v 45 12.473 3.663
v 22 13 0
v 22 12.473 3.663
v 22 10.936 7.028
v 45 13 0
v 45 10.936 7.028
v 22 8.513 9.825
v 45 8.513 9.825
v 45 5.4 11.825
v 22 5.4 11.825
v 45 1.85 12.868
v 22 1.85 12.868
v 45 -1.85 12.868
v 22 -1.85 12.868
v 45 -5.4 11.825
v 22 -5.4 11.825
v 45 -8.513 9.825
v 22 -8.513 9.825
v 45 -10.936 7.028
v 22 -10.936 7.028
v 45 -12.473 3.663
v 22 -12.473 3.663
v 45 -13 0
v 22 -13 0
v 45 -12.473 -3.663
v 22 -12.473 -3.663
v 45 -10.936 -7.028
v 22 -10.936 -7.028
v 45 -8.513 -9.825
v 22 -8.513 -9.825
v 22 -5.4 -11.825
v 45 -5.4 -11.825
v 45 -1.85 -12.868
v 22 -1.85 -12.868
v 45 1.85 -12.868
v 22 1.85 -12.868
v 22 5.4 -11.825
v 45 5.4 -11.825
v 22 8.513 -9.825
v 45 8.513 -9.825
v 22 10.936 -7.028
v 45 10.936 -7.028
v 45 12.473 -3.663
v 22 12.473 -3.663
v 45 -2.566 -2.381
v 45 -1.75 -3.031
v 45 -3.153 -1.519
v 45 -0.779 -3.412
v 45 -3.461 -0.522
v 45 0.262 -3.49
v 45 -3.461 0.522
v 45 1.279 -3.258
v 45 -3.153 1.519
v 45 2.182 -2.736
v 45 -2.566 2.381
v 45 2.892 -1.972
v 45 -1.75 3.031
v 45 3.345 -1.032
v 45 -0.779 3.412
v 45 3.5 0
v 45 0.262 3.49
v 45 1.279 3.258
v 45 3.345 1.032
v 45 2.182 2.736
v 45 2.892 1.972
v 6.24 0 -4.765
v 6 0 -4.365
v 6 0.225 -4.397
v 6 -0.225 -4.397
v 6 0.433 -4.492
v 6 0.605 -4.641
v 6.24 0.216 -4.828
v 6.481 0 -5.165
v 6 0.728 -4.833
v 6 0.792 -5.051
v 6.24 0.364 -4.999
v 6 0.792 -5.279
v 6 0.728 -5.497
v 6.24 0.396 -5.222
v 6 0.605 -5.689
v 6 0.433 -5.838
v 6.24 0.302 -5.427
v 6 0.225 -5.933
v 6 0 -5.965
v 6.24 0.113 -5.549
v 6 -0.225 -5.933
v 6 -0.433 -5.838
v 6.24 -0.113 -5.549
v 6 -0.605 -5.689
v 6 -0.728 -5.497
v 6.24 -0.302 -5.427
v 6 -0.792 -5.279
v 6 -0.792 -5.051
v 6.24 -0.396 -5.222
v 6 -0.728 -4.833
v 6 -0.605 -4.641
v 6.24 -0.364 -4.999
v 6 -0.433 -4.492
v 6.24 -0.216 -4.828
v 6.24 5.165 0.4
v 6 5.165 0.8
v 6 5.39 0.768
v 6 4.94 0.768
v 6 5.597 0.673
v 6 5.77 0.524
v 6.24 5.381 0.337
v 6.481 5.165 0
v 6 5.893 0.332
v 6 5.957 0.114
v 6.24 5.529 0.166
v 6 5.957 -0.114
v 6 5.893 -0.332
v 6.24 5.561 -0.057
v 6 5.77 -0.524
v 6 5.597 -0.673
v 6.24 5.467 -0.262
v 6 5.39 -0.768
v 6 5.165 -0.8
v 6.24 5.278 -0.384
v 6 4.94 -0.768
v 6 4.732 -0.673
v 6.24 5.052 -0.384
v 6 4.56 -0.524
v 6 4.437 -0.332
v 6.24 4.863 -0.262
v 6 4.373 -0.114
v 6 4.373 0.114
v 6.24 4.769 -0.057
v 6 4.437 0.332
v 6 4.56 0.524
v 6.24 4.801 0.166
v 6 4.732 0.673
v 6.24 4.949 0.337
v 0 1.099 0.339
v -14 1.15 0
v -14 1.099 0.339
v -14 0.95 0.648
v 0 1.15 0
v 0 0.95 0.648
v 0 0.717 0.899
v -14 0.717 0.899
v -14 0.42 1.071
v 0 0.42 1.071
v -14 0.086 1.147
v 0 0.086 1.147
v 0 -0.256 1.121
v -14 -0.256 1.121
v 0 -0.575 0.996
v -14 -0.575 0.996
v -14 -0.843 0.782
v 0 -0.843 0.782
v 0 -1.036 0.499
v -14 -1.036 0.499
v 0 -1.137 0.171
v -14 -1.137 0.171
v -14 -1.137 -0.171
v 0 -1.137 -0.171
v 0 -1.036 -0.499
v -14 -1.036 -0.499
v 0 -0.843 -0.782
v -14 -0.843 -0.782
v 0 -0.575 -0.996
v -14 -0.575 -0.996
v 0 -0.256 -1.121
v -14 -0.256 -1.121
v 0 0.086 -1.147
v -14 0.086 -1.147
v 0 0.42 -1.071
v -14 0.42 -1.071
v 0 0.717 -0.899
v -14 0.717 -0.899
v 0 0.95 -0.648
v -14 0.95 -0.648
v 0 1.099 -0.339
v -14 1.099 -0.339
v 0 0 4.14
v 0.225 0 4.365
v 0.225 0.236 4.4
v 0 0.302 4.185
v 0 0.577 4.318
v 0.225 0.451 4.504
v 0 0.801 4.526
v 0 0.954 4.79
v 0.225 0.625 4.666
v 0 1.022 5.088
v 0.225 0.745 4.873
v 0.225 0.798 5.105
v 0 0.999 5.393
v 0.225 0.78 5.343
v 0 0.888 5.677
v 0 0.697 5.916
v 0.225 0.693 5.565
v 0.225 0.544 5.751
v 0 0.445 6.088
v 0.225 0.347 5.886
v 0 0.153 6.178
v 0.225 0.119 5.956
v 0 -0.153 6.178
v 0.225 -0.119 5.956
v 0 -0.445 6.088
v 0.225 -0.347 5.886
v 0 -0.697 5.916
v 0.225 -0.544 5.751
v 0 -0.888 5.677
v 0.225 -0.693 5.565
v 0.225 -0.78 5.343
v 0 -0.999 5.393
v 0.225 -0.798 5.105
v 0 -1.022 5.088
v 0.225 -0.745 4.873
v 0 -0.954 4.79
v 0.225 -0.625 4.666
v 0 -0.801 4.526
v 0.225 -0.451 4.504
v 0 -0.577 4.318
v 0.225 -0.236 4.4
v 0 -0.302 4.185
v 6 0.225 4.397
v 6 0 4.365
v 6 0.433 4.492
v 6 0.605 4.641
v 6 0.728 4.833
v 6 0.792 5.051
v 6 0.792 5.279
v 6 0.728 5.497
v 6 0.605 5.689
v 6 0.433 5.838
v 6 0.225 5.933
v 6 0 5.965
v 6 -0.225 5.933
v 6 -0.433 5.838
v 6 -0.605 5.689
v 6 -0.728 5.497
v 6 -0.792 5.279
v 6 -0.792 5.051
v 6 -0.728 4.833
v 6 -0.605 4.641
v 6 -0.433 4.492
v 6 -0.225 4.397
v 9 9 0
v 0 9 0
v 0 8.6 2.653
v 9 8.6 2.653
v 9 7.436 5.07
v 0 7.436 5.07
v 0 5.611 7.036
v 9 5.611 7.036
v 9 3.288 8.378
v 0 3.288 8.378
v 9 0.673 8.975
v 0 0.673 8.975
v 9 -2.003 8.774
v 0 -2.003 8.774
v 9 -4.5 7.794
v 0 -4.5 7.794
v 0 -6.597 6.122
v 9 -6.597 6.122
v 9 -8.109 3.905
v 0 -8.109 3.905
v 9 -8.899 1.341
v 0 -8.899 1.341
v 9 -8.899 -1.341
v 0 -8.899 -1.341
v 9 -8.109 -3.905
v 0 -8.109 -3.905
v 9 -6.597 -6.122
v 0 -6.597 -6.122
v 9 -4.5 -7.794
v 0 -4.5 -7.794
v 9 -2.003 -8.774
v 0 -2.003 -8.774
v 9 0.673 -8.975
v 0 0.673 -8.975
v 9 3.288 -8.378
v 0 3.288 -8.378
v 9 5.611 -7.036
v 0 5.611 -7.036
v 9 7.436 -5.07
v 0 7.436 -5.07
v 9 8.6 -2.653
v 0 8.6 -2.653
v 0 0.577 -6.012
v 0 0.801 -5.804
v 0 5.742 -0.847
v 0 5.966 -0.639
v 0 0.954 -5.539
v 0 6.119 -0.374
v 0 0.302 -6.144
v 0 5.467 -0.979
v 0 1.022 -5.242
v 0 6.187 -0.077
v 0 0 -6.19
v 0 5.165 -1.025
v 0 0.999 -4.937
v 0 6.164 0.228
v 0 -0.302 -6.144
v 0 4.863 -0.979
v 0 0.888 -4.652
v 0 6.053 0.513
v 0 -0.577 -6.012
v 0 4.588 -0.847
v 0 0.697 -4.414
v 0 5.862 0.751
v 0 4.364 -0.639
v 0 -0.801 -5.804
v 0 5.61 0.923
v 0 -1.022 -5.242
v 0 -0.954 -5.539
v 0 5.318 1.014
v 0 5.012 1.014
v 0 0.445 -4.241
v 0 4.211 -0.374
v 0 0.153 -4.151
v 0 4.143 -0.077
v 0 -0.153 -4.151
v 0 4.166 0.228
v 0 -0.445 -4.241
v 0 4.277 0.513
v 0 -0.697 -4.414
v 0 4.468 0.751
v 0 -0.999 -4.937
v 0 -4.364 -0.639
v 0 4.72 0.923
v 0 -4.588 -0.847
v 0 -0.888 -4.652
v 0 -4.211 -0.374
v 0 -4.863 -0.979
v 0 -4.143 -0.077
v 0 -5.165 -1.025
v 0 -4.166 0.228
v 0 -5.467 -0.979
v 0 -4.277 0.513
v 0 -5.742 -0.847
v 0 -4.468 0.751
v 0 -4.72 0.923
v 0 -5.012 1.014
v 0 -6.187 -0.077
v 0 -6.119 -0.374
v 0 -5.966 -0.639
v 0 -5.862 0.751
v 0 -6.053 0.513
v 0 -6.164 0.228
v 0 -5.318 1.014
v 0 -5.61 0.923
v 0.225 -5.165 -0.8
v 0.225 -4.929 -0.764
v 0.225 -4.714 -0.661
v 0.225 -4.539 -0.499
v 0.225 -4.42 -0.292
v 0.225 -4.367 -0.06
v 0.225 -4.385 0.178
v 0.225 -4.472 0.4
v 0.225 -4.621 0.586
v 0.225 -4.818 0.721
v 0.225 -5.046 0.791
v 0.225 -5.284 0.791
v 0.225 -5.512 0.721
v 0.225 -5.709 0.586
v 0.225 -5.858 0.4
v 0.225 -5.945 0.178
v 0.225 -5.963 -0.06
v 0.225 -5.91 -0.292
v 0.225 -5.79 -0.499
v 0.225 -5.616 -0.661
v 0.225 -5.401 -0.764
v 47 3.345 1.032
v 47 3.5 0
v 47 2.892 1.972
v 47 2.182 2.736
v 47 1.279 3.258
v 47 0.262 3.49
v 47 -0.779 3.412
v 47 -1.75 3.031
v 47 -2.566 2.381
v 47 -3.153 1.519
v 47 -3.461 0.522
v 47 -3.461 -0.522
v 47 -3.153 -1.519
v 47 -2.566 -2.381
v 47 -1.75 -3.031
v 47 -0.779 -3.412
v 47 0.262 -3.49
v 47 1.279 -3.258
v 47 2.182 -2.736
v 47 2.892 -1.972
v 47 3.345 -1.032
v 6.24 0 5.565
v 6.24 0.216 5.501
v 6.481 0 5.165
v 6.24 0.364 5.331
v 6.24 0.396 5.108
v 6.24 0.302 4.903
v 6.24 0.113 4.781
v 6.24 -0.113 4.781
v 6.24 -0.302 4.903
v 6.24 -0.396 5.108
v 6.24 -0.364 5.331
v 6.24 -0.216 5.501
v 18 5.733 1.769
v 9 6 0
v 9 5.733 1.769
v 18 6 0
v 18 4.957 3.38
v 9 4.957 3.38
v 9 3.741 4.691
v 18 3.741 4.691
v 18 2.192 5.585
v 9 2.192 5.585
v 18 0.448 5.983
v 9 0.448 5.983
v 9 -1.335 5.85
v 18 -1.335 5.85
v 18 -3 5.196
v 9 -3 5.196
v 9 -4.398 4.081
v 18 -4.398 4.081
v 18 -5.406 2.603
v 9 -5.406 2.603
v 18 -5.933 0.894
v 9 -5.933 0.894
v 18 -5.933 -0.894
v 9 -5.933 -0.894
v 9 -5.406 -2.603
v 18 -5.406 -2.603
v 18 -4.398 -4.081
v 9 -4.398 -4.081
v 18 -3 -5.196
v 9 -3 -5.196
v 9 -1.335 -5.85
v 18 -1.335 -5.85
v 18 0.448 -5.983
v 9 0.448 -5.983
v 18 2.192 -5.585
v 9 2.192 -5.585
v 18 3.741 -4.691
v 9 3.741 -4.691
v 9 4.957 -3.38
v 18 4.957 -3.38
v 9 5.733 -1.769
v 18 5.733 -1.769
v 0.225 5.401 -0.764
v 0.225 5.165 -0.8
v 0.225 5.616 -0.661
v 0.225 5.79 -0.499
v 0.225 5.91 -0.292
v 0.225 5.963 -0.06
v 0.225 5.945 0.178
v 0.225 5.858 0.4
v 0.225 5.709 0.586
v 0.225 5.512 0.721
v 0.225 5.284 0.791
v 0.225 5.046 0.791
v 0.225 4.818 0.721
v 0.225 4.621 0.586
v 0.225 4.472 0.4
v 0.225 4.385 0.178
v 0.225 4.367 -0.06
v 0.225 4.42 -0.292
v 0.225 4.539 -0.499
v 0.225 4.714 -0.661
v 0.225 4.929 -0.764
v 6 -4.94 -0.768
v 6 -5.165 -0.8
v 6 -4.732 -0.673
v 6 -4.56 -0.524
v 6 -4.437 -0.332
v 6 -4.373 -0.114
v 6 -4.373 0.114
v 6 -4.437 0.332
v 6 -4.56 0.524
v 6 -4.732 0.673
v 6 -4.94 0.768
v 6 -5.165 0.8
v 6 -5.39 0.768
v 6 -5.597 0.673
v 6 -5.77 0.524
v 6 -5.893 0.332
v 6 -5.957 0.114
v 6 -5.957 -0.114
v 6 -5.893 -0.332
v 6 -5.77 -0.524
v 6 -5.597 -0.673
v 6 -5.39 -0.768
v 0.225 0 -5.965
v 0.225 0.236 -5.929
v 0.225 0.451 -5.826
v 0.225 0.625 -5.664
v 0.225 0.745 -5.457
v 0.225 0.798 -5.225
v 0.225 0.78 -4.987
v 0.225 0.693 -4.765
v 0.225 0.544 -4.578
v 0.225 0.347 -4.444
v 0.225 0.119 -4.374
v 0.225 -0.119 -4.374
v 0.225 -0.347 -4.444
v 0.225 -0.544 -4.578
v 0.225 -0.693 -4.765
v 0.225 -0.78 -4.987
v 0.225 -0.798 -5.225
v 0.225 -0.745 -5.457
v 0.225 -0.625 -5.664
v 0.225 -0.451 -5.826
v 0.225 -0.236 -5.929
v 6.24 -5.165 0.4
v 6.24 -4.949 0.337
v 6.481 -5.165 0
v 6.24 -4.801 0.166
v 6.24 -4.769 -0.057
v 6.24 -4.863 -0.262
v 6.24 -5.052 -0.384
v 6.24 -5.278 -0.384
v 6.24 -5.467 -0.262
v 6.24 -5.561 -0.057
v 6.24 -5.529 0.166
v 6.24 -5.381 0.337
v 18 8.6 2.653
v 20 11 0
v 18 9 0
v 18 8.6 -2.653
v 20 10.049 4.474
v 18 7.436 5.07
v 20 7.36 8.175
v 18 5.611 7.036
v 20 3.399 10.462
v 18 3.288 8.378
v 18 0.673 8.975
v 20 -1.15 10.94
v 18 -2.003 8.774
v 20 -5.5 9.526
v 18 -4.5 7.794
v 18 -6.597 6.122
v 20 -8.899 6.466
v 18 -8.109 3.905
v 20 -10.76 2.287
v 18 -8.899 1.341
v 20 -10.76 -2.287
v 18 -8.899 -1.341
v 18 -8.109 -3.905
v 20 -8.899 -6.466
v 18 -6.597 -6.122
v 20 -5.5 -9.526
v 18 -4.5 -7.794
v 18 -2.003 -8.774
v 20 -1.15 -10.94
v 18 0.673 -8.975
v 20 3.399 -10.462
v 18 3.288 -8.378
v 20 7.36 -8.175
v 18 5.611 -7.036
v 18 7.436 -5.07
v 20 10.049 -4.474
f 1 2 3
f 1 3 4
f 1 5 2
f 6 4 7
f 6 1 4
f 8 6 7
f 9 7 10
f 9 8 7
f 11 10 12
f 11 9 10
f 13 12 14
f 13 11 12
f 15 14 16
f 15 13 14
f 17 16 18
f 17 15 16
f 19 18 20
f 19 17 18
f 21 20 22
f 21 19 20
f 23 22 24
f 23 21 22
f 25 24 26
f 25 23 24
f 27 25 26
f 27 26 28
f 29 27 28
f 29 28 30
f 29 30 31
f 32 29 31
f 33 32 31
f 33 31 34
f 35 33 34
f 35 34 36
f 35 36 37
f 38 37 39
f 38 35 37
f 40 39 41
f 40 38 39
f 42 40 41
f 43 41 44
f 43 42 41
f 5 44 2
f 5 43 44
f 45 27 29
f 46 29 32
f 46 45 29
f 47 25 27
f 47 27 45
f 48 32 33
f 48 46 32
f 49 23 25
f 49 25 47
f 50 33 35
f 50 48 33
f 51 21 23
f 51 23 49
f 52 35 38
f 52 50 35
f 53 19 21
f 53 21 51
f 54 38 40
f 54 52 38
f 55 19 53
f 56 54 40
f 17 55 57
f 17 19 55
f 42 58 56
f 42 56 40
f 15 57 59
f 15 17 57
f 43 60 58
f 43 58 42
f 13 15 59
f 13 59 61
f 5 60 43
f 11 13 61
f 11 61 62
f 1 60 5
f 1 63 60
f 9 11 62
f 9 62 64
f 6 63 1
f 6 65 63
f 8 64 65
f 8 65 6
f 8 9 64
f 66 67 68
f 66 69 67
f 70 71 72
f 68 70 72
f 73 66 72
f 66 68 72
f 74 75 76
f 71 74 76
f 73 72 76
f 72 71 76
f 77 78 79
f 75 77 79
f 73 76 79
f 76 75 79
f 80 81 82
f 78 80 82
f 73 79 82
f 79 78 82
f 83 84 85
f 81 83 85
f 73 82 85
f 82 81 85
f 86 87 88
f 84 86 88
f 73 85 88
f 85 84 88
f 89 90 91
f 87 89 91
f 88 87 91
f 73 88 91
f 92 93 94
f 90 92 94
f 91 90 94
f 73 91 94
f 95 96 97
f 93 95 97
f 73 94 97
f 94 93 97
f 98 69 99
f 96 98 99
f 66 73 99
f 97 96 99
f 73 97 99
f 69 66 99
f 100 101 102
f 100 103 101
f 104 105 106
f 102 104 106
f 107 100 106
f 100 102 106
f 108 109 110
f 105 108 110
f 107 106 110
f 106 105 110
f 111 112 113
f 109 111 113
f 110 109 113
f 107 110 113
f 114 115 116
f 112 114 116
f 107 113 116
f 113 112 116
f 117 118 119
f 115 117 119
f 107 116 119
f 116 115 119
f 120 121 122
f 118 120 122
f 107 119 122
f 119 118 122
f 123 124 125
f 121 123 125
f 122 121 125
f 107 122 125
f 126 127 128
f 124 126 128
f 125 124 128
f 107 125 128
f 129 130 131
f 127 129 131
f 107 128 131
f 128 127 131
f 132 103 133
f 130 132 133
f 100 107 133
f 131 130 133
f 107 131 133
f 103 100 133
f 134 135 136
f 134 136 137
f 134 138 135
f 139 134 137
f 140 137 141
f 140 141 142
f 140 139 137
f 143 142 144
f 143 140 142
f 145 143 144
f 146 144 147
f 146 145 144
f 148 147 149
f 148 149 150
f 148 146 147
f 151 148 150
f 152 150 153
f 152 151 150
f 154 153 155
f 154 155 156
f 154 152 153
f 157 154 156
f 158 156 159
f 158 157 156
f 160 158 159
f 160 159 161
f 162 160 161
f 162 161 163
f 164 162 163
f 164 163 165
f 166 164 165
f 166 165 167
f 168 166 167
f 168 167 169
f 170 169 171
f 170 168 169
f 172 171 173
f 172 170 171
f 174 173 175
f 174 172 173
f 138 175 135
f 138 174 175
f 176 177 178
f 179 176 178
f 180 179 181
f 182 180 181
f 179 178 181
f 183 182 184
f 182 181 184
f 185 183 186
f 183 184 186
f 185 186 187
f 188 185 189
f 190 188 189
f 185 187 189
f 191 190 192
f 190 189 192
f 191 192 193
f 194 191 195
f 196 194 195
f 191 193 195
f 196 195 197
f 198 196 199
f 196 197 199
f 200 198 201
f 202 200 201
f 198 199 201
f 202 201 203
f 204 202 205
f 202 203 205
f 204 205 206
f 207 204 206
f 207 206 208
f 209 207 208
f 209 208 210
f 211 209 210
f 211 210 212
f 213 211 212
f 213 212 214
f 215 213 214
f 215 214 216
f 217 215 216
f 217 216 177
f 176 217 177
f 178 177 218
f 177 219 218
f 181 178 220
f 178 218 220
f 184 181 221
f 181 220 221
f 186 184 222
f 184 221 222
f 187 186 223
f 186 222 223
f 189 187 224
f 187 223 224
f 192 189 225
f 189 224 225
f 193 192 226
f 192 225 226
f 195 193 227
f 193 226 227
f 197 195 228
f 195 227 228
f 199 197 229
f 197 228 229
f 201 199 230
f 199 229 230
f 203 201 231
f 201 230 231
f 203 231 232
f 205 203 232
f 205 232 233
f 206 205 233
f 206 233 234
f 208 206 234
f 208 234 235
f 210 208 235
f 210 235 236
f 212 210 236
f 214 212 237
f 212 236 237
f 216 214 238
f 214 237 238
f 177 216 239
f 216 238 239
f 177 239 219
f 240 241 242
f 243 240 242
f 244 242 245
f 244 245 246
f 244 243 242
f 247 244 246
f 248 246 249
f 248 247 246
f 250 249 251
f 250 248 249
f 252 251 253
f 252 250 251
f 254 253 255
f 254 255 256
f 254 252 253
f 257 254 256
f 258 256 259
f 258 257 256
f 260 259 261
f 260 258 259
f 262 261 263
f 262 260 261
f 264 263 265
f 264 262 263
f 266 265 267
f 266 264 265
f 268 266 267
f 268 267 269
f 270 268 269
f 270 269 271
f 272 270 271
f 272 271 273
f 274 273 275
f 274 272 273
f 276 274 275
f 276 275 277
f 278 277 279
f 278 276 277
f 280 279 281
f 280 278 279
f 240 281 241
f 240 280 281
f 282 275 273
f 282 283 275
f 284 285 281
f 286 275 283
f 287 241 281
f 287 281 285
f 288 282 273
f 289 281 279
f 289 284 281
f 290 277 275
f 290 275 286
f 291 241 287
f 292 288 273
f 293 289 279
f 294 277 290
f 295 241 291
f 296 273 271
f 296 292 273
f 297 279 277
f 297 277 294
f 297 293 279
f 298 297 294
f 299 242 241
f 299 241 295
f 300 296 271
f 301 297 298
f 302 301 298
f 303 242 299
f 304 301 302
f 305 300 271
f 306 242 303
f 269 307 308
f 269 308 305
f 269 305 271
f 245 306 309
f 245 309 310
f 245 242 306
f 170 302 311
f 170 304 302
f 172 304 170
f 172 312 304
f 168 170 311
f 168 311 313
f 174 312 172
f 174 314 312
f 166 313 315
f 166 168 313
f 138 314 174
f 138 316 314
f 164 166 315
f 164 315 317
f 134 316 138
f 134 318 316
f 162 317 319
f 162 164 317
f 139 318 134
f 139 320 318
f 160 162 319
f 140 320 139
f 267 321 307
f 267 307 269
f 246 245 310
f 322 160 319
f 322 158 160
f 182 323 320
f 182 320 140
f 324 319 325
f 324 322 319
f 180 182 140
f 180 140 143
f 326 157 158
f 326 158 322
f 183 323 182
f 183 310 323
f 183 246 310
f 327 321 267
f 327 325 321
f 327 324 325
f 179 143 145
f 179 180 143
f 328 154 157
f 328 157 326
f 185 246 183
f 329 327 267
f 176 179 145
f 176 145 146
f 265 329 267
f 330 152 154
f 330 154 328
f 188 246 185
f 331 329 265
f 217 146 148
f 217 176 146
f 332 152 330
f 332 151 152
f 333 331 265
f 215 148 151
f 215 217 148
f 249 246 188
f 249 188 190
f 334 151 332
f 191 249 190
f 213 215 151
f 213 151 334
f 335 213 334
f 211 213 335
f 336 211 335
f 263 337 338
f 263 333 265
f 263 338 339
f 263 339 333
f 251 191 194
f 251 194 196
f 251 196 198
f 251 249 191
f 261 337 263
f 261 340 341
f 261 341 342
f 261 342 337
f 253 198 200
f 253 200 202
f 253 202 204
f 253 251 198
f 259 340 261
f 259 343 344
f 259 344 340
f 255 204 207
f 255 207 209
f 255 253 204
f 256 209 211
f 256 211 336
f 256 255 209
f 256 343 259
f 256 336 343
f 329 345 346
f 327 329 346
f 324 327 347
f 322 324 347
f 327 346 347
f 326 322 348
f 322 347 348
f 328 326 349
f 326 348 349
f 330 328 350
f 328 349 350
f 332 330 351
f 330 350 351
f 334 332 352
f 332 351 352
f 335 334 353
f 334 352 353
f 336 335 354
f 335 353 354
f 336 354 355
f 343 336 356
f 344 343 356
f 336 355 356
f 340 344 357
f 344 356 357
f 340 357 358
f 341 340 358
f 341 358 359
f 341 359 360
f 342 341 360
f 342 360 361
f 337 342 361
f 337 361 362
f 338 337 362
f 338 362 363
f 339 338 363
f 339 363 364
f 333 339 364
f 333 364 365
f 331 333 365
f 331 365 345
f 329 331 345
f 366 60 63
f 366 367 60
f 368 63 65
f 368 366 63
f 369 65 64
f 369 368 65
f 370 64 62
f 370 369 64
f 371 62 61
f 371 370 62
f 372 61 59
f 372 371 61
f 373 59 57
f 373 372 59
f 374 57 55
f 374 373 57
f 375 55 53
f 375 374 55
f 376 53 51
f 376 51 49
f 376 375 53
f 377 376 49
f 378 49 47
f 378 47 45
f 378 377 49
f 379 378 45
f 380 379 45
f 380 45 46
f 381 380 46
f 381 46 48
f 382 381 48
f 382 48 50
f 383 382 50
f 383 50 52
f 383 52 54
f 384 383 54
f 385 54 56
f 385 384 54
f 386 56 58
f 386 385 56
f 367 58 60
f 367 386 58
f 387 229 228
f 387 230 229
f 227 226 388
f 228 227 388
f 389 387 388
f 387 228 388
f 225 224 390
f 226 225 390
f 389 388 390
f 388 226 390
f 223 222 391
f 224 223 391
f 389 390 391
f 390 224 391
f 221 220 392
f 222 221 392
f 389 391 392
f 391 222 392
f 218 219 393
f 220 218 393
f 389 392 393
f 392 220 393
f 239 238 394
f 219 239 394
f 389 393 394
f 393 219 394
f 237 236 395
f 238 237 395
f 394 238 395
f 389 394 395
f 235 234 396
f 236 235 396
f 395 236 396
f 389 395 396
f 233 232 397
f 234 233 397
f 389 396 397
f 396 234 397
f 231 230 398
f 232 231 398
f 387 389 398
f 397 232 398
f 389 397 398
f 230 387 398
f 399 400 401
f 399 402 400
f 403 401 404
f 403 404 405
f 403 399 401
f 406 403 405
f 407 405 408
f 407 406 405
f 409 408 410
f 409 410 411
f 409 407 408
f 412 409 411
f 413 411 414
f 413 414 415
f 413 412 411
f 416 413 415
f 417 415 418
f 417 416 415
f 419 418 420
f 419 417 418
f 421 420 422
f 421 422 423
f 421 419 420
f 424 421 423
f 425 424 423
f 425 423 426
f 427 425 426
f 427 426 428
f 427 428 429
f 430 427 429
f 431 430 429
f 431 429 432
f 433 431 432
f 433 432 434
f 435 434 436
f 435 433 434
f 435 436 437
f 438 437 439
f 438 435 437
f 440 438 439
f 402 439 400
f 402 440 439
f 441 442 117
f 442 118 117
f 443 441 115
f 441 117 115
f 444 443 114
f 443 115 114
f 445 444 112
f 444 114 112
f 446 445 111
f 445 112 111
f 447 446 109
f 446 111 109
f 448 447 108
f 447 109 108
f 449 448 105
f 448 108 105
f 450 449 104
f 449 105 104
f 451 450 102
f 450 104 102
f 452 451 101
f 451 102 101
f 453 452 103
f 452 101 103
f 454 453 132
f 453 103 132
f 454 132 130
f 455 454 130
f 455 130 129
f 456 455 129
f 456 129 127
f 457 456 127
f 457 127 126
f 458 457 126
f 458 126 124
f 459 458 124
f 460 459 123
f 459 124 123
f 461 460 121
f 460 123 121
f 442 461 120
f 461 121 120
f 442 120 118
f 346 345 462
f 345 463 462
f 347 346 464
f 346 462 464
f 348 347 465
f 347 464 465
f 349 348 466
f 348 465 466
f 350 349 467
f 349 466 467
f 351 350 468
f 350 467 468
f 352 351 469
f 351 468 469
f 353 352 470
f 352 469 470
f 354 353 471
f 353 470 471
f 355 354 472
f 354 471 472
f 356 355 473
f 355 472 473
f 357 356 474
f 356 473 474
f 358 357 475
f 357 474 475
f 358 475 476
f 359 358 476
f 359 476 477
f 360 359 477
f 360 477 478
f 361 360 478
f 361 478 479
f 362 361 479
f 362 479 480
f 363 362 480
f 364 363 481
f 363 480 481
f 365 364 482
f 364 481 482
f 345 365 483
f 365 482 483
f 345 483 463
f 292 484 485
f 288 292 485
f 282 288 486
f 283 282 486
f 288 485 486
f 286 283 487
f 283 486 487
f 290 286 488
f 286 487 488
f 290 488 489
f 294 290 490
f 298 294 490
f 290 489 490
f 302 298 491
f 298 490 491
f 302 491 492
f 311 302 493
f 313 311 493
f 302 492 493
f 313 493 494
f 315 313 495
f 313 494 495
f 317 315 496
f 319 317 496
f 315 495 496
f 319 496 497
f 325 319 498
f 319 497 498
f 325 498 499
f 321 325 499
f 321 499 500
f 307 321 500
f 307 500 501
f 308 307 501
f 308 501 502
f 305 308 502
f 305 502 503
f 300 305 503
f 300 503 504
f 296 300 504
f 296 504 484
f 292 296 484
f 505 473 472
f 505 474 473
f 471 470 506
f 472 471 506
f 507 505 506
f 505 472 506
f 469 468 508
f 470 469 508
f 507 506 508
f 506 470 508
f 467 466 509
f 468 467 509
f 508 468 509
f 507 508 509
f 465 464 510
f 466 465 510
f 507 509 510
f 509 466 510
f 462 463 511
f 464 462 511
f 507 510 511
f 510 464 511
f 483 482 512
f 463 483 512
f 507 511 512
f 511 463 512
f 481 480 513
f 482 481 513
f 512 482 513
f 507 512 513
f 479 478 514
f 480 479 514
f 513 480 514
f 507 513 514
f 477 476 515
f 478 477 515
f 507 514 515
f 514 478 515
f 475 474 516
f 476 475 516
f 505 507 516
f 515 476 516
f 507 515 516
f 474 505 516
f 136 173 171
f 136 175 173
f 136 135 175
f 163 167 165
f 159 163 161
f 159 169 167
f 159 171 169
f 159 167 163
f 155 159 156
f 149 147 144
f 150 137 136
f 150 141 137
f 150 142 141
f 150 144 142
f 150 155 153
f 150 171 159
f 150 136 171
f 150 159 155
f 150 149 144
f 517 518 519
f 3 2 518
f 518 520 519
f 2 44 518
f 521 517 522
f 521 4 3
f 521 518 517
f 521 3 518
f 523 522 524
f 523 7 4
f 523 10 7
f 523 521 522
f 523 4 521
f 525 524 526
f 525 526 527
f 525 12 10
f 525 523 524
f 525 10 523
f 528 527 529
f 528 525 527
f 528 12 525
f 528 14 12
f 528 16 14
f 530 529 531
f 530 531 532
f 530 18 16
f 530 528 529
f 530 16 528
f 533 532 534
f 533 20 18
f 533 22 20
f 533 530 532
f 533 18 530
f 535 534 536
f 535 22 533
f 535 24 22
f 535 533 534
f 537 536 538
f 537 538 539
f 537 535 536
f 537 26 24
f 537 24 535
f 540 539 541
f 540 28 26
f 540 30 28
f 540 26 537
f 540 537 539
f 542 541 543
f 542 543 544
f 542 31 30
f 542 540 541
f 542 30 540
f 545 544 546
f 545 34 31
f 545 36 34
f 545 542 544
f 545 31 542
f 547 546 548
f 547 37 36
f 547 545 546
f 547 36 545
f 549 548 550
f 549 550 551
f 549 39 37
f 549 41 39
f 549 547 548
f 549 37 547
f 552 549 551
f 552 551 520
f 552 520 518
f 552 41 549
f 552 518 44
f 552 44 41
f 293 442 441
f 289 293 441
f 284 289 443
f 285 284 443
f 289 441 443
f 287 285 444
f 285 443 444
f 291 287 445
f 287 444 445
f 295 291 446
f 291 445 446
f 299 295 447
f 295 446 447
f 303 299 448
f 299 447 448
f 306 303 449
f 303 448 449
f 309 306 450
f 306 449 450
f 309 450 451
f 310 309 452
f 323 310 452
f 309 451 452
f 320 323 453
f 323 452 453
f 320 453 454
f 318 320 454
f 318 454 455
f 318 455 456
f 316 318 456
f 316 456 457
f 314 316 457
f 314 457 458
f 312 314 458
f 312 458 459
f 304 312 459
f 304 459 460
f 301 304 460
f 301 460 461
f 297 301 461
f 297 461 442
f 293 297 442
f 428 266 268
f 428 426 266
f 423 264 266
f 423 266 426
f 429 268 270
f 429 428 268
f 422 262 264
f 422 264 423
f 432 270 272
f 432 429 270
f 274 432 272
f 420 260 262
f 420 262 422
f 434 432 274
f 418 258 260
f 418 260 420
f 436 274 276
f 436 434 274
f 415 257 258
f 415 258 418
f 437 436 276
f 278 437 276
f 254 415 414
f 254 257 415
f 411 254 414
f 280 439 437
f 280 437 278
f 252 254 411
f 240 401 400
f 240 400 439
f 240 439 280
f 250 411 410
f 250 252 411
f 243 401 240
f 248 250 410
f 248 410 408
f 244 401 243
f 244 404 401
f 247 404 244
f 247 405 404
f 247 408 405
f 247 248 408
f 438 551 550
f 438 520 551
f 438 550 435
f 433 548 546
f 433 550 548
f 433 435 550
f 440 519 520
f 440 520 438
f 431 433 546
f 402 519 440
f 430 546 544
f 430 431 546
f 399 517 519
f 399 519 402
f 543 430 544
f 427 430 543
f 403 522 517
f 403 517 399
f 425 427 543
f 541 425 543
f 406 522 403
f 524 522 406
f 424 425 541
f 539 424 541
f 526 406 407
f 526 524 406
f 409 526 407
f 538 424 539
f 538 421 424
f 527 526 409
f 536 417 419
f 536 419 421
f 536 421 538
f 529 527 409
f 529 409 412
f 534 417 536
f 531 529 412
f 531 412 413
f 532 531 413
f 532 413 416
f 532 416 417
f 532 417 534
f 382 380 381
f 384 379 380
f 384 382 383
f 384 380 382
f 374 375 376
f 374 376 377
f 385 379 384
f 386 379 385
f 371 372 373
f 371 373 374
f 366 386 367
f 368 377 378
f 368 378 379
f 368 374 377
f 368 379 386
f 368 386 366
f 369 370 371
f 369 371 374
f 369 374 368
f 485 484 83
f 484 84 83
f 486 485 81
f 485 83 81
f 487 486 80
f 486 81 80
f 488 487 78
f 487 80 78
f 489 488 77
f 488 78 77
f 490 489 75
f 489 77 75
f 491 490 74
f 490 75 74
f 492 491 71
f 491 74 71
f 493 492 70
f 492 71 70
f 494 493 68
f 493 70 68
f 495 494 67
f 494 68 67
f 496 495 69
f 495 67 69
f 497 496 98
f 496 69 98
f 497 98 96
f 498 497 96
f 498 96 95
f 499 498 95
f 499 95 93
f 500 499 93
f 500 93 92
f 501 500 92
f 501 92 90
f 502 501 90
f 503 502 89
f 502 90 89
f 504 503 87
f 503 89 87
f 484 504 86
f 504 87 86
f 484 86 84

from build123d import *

# Parameters (mm, degrees)
TROU_TARAUD_M2X0_41_D           = 1.6
TROU_TARAUD_M2X0_41_DEPTH       = 6
TROU_TARAUD_M2X0_41_CSINK_D     = 2.05
TROU_TARAUD_M2X0_41_CSINK_ANGLE = 90
TROU_TARAUD_M2X0_41_TIP         = 0.480688495


with BuildPart() as part:
    # Esquisse1 → Révolution1 (revolve)
    with BuildSketch(Plane.XY):
        Polygon((-14, 1.15), (0, 1.15), (0, 9), (9, 9), (9, 6), (18, 6), (18, 9), (22, 13), (45, 13), (45, 3.5), (47, 3.5), (47, 0), (-14, 0), align=None)
    revolve(axis=Axis((-25.880121982, 0, 0), (1, 0, 0)))

    # Trou taraudé M2x0.41
    with Locations(Plane.ZY):
        with Locations((0, 5.164935058), (5.164935058, 0), (0, -5.164935058), (-5.164935058, 0)):
            CounterSinkHole(TROU_TARAUD_M2X0_41_D / 2, TROU_TARAUD_M2X0_41_CSINK_D / 2, depth=TROU_TARAUD_M2X0_41_DEPTH, counter_sink_angle=TROU_TARAUD_M2X0_41_CSINK_ANGLE)
            with Locations((0, 0, -(TROU_TARAUD_M2X0_41_DEPTH + TROU_TARAUD_M2X0_41_TIP / 2))):  # 118° drill point
                Cone(0, TROU_TARAUD_M2X0_41_D / 2, TROU_TARAUD_M2X0_41_TIP, mode=Mode.SUBTRACT)


solid = part.part
